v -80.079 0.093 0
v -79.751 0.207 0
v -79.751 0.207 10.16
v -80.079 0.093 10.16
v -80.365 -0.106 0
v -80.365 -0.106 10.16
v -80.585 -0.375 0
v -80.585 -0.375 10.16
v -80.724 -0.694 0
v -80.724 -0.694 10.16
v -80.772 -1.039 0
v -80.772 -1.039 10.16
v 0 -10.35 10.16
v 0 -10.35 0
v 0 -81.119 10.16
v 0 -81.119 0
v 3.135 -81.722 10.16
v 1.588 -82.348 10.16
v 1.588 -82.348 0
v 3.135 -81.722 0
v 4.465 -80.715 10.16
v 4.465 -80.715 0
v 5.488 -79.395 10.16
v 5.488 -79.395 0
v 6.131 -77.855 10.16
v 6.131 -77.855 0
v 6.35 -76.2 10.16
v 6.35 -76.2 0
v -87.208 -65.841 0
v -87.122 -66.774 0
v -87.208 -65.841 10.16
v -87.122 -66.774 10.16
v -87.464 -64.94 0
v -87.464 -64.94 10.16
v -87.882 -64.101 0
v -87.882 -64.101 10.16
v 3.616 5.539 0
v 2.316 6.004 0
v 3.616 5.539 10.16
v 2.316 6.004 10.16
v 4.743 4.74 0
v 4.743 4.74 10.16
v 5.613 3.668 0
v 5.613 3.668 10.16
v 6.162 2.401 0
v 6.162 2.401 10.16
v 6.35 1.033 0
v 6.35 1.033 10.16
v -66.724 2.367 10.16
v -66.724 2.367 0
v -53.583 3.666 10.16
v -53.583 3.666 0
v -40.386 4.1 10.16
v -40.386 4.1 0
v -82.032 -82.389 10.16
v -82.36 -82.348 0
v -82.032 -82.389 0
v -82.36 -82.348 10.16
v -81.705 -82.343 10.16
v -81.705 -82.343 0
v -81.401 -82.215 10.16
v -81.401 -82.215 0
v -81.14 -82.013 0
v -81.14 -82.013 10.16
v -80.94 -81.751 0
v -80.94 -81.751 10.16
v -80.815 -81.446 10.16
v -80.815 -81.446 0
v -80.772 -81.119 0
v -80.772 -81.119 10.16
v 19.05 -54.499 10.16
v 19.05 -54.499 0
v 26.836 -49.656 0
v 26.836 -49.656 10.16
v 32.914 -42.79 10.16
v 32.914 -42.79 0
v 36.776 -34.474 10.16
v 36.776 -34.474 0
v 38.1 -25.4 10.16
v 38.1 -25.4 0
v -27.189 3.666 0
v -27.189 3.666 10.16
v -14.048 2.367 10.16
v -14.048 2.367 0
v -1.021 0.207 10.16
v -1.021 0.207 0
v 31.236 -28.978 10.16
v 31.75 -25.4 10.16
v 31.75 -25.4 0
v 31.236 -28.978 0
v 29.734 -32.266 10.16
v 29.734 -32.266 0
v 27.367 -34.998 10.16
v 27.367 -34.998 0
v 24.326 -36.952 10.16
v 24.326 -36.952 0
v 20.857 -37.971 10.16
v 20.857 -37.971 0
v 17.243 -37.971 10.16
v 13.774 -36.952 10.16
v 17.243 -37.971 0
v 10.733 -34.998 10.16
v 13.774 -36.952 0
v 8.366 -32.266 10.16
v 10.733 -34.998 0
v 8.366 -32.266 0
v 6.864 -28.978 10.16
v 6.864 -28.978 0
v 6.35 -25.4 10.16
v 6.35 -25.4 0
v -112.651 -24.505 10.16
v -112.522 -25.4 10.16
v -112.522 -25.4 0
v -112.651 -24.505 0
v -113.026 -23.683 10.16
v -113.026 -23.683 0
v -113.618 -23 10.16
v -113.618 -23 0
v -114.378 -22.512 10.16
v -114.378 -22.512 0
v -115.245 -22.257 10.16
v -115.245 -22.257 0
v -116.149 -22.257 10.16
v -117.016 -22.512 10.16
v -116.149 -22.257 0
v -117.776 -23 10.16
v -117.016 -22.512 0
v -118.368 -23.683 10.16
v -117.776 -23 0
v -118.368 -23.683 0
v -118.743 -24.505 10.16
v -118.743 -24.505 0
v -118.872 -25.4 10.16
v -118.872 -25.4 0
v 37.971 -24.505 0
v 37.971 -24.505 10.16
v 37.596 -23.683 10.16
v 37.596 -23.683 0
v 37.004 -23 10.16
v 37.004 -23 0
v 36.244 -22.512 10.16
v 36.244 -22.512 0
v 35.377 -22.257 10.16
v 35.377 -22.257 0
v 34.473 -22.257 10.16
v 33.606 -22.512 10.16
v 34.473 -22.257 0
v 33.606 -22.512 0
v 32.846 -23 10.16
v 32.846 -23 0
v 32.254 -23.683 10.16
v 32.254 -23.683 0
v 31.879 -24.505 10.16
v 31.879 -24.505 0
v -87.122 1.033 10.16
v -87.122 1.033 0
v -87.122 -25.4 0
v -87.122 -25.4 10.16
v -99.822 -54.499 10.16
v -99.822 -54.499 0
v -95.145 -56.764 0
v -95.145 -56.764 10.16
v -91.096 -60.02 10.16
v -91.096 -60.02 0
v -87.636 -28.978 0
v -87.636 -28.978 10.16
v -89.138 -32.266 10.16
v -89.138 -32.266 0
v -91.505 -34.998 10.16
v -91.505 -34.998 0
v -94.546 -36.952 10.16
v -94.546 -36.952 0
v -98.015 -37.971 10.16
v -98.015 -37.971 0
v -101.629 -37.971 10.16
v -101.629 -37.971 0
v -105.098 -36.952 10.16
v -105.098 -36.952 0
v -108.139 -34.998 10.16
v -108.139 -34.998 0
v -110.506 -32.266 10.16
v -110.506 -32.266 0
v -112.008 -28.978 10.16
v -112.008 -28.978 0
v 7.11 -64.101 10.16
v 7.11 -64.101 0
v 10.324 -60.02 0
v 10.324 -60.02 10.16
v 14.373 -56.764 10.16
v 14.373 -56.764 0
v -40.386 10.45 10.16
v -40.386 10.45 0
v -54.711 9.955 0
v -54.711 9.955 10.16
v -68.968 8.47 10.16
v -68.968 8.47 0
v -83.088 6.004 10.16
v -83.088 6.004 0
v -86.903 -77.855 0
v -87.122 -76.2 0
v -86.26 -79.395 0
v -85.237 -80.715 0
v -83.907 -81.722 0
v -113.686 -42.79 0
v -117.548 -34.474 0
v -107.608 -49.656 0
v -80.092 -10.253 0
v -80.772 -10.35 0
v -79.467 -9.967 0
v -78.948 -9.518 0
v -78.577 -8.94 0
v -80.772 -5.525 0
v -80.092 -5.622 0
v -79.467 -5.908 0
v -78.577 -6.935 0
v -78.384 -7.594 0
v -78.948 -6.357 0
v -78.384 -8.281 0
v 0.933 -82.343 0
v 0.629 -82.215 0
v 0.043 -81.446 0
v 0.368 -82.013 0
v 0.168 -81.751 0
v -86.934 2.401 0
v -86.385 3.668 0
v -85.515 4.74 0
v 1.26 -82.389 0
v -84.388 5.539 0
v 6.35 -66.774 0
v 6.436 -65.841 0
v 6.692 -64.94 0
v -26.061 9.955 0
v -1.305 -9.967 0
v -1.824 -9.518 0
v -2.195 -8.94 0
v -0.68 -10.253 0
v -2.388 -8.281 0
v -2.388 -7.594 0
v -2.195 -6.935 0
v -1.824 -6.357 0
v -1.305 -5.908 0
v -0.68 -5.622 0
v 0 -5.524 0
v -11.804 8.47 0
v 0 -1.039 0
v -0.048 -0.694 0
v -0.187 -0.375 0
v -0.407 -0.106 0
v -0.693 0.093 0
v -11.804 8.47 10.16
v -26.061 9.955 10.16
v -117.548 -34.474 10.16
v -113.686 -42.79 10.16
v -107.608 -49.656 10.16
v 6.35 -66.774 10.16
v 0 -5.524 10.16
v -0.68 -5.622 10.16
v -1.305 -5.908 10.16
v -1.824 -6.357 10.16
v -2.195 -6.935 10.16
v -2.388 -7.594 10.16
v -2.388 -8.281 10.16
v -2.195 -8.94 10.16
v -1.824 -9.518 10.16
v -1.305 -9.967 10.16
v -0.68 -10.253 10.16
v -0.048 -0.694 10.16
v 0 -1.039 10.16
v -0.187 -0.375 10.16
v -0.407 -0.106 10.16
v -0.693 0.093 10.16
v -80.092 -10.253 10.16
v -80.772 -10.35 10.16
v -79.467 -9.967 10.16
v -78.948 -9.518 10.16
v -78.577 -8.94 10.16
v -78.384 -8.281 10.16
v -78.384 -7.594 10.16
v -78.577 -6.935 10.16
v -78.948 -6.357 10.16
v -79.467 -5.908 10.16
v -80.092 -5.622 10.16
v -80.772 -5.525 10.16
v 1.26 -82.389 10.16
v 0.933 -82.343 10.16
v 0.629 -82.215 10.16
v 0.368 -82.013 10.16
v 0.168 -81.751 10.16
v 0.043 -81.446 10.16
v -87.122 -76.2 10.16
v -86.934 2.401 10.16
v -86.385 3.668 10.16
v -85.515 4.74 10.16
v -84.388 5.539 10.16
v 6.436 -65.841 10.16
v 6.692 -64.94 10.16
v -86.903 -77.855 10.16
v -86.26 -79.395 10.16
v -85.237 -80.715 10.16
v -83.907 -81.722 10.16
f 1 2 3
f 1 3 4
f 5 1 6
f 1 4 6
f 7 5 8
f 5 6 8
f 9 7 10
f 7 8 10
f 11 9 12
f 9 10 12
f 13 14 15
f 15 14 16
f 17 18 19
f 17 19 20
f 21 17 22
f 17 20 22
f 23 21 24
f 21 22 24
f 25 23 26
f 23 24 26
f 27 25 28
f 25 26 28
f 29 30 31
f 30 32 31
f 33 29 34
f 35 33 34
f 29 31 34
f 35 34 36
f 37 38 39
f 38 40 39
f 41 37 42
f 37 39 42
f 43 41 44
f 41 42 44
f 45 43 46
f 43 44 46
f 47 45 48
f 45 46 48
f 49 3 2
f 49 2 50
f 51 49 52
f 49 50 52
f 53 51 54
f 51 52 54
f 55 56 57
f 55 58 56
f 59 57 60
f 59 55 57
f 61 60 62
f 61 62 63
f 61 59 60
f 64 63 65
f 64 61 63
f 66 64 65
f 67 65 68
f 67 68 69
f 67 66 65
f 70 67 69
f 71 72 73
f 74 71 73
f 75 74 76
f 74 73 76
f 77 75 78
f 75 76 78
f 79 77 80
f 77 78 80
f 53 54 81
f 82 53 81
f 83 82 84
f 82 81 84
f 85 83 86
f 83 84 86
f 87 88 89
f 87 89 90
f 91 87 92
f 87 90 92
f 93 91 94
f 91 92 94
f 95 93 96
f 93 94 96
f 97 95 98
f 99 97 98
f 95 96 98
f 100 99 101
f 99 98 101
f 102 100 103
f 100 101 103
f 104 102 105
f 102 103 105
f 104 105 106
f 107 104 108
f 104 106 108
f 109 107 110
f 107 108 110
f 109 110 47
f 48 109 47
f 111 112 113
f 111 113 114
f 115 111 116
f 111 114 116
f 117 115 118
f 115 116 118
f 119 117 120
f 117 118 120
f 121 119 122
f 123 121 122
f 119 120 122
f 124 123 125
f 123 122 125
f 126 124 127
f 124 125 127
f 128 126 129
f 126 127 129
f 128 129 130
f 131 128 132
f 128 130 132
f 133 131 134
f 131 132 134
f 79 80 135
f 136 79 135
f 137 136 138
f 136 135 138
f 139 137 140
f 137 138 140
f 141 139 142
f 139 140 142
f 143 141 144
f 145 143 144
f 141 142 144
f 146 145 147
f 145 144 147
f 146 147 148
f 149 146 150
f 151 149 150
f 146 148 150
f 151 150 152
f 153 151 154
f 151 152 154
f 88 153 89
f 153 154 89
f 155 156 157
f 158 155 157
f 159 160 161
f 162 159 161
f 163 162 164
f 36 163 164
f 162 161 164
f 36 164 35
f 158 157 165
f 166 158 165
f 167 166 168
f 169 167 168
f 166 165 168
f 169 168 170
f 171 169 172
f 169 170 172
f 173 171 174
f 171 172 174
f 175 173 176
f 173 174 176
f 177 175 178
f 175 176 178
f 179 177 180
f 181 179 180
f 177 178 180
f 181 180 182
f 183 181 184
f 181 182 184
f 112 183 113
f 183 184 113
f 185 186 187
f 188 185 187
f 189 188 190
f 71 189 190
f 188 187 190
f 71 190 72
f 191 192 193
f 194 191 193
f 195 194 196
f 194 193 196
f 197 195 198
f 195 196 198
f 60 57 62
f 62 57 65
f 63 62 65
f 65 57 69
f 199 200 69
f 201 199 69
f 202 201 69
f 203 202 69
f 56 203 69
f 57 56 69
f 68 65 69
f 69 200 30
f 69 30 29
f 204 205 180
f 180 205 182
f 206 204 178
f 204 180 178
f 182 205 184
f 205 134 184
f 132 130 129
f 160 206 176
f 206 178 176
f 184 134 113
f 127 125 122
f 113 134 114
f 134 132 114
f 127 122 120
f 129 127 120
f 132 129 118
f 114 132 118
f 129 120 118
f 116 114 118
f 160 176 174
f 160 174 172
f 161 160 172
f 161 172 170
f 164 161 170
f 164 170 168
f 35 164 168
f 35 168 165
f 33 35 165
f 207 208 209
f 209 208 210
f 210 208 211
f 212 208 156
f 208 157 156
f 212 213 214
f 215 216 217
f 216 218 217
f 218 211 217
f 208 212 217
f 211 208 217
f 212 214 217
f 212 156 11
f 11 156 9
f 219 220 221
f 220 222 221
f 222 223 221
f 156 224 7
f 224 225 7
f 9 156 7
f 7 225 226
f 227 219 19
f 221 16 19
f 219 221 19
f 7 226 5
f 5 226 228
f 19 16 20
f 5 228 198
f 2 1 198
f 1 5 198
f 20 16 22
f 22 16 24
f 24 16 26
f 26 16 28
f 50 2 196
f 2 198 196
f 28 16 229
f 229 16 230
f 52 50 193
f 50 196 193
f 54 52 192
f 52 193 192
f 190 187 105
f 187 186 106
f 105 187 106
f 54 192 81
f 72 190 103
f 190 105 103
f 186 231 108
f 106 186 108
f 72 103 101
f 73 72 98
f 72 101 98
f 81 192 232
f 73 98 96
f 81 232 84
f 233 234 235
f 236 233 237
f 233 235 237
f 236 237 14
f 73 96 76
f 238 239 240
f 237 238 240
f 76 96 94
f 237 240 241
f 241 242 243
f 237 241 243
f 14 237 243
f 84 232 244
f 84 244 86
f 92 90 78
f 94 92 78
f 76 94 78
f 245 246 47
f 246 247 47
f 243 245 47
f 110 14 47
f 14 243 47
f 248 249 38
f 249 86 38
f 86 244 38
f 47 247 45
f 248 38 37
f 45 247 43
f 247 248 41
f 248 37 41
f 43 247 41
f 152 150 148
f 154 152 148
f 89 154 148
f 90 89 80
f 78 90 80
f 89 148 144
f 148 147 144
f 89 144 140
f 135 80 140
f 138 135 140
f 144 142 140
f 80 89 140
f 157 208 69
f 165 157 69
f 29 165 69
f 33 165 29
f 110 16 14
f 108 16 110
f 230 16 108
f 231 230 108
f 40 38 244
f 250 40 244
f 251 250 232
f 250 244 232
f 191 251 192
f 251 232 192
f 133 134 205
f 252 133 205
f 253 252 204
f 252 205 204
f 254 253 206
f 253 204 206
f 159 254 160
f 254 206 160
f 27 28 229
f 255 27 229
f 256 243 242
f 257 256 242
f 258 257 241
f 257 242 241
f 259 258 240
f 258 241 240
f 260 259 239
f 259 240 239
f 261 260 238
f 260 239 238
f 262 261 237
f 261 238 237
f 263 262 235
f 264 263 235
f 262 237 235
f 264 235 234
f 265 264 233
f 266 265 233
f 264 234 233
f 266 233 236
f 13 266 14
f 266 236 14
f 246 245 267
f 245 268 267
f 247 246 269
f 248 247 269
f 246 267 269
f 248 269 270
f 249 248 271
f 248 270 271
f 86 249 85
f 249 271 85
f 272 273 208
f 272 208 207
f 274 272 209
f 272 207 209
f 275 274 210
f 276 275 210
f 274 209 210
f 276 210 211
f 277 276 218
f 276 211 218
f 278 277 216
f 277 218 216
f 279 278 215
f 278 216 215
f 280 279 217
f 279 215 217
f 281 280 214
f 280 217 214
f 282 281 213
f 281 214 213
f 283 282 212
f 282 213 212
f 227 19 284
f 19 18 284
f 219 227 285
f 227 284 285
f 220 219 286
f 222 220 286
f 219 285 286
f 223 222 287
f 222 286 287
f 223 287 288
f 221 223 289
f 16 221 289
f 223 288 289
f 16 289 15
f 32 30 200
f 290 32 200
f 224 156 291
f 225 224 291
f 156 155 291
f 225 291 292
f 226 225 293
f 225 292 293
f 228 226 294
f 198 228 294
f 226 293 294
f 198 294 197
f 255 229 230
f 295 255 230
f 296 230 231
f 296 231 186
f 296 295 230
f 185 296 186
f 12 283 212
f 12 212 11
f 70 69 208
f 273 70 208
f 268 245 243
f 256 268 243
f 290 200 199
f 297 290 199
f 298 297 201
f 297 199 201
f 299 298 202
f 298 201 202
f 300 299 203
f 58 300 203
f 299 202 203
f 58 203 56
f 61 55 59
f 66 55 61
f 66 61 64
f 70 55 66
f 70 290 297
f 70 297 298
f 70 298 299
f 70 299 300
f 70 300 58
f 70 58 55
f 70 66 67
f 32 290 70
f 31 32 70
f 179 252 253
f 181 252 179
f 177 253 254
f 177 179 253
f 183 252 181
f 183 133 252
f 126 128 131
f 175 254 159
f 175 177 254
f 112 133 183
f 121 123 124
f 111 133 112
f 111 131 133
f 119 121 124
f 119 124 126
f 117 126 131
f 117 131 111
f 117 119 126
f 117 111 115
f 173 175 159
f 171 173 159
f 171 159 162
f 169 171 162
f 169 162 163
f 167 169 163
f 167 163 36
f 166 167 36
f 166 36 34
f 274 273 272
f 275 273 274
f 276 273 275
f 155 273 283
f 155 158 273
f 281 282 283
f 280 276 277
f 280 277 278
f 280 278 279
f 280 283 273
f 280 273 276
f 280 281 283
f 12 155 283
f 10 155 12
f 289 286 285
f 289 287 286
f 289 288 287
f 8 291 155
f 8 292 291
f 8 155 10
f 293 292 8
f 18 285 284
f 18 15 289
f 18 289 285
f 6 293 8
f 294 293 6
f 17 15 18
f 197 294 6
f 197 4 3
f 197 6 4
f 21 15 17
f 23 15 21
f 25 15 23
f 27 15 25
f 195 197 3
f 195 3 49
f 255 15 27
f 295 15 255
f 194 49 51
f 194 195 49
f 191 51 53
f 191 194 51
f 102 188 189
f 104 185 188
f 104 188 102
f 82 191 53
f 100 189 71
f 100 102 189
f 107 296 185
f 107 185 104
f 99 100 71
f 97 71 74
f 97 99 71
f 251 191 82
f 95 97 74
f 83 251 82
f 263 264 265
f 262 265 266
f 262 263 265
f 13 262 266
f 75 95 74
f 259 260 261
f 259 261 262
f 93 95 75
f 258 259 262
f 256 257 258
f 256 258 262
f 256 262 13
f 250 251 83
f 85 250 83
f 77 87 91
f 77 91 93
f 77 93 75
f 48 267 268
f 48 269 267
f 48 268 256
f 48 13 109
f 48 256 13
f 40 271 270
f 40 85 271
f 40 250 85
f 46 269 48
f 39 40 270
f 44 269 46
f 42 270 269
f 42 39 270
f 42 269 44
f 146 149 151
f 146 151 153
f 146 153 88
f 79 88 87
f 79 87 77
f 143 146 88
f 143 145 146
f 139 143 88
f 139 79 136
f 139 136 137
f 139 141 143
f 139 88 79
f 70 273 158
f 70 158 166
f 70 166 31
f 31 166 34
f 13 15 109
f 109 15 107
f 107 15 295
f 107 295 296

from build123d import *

# Parameters (mm, degrees)
F2_DEPTH = 10.16
F3_R     = 2.413
F4_DEPTH = 10.16
F5_R     = 5.08
F6_R     = 1.27
F8_DEPTH = 10.16
F9_R     = 5.08


# Not quite as in the source:
# - a variable given as a bare number and used for a length is read in inches; the dataset says mm whatever the document's units were
# - a feature names something its author has since deleted; it is built from what else it names


with BuildPart() as f2:
    # F1 (on Top) → F2 (new body)
    with BuildSketch(Plane.XY):
        with BuildLine():
            Line((0, 0), (0, -76.2))
            Line((0, -76.2), (0, -82.55))
            ThreePointArc((0, -82.55), (4.4901280605, -80.6901280605), (6.35, -76.2))
            Line((6.35, -76.2), (6.35, 5.1130828846))
            ThreePointArc((6.35, 5.1130828846), (-16.8661271179, 9.1115403998), (-40.386, 10.4501219109))
            ThreePointArc((-40.386, 10.4501219109), (-63.9058728821, 9.1115403998), (-87.122, 5.1130828846))
            Line((-87.122, 5.1130828846), (-87.122, -76.2))
            ThreePointArc((-87.122, -76.2), (-85.2621280605, -80.6901280605), (-80.772, -82.55))
            Line((-80.772, -82.55), (-80.772, -76.2))
            Line((-80.772, -76.2), (-80.772, 0))
            ThreePointArc((-80.772, 0), (-60.6827977504, 3.072463713), (-40.386, 4.1001219109))
            ThreePointArc((-40.386, 4.1001219109), (-20.0892022496, 3.072463713), (0, 0))
        make_face()
    extrude(amount=F2_DEPTH)

    # F3 (on Top) → F4 (join)
    with BuildSketch(Plane.XY):
        with Locations((0, -7.9375)):
            Circle(F3_R)
        with Locations((-80.772, -7.9375)):
            Circle(F3_R)
    extrude(amount=F4_DEPTH)

    # F5
    f5_edges = [f2.edges().sort_by_distance(p)[0] for p in [
        (-87.122, 5.113083, 5.08),
        (6.35, 5.113083, 5.08),
    ]]
    fillet(f5_edges, radius=F5_R)

    # F6
    f6_edges = [f2.edges().sort_by_distance(p)[0] for p in [
        (0, -82.55, 5.08),
        (-80.772, -82.55, 5.08),
        (0, 0, 5.08),
        (-80.772, 0, 5.08),
    ]]
    fillet(f6_edges, radius=F6_R)

    # F7 (on Top) → F8 (join)
    with BuildSketch(Plane.XY):
        with BuildLine():
            ThreePointArc((31.75, -25.4), (19.05, -38.1), (6.35, -25.4))
            Line((6.35, -25.4), (6.35, -65.42595876))
            ThreePointArc((6.35, -65.42595876), (11.6697145424, -58.7651555547), (19.05, -54.499355663))
            ThreePointArc((19.05, -54.499355663), (32.9139558425, -42.7901912008), (38.1, -25.4))
            ThreePointArc((38.1, -25.4), (34.925, -28.575), (31.75, -25.4))
        make_face()
        with BuildLine():
            ThreePointArc((38.1, -25.4), (34.925, -22.225), (31.75, -25.4))
            ThreePointArc((31.75, -25.4), (34.925, -28.575), (38.1, -25.4))
        make_face()
        with BuildLine():
            Line((-87.122, -65.42595876), (-87.122, -25.4))
            ThreePointArc((-87.122, -25.4), (-99.822, -38.1), (-112.522, -25.4))
            ThreePointArc((-112.522, -25.4), (-115.697, -28.575), (-118.872, -25.4))
            ThreePointArc((-118.872, -25.4), (-113.6859558425, -42.7901912008), (-99.822, -54.499355663))
            ThreePointArc((-99.822, -54.499355663), (-92.4417145424, -58.7651555547), (-87.122, -65.42595876))
        make_face()
        with BuildLine():
            ThreePointArc((-118.872, -25.4), (-115.697, -28.575), (-112.522, -25.4))
            ThreePointArc((-112.522, -25.4), (-115.697, -22.225), (-118.872, -25.4))
        make_face()
    extrude(amount=F8_DEPTH)

    # F9
    f9_edges = [f2.edges().sort_by_distance(p)[0] for p in [
        (6.35, -65.425959, 5.08),
        (-87.122, -65.425959, 5.08),
    ]]
    fillet(f9_edges, radius=F9_R)


solid = f2.part
